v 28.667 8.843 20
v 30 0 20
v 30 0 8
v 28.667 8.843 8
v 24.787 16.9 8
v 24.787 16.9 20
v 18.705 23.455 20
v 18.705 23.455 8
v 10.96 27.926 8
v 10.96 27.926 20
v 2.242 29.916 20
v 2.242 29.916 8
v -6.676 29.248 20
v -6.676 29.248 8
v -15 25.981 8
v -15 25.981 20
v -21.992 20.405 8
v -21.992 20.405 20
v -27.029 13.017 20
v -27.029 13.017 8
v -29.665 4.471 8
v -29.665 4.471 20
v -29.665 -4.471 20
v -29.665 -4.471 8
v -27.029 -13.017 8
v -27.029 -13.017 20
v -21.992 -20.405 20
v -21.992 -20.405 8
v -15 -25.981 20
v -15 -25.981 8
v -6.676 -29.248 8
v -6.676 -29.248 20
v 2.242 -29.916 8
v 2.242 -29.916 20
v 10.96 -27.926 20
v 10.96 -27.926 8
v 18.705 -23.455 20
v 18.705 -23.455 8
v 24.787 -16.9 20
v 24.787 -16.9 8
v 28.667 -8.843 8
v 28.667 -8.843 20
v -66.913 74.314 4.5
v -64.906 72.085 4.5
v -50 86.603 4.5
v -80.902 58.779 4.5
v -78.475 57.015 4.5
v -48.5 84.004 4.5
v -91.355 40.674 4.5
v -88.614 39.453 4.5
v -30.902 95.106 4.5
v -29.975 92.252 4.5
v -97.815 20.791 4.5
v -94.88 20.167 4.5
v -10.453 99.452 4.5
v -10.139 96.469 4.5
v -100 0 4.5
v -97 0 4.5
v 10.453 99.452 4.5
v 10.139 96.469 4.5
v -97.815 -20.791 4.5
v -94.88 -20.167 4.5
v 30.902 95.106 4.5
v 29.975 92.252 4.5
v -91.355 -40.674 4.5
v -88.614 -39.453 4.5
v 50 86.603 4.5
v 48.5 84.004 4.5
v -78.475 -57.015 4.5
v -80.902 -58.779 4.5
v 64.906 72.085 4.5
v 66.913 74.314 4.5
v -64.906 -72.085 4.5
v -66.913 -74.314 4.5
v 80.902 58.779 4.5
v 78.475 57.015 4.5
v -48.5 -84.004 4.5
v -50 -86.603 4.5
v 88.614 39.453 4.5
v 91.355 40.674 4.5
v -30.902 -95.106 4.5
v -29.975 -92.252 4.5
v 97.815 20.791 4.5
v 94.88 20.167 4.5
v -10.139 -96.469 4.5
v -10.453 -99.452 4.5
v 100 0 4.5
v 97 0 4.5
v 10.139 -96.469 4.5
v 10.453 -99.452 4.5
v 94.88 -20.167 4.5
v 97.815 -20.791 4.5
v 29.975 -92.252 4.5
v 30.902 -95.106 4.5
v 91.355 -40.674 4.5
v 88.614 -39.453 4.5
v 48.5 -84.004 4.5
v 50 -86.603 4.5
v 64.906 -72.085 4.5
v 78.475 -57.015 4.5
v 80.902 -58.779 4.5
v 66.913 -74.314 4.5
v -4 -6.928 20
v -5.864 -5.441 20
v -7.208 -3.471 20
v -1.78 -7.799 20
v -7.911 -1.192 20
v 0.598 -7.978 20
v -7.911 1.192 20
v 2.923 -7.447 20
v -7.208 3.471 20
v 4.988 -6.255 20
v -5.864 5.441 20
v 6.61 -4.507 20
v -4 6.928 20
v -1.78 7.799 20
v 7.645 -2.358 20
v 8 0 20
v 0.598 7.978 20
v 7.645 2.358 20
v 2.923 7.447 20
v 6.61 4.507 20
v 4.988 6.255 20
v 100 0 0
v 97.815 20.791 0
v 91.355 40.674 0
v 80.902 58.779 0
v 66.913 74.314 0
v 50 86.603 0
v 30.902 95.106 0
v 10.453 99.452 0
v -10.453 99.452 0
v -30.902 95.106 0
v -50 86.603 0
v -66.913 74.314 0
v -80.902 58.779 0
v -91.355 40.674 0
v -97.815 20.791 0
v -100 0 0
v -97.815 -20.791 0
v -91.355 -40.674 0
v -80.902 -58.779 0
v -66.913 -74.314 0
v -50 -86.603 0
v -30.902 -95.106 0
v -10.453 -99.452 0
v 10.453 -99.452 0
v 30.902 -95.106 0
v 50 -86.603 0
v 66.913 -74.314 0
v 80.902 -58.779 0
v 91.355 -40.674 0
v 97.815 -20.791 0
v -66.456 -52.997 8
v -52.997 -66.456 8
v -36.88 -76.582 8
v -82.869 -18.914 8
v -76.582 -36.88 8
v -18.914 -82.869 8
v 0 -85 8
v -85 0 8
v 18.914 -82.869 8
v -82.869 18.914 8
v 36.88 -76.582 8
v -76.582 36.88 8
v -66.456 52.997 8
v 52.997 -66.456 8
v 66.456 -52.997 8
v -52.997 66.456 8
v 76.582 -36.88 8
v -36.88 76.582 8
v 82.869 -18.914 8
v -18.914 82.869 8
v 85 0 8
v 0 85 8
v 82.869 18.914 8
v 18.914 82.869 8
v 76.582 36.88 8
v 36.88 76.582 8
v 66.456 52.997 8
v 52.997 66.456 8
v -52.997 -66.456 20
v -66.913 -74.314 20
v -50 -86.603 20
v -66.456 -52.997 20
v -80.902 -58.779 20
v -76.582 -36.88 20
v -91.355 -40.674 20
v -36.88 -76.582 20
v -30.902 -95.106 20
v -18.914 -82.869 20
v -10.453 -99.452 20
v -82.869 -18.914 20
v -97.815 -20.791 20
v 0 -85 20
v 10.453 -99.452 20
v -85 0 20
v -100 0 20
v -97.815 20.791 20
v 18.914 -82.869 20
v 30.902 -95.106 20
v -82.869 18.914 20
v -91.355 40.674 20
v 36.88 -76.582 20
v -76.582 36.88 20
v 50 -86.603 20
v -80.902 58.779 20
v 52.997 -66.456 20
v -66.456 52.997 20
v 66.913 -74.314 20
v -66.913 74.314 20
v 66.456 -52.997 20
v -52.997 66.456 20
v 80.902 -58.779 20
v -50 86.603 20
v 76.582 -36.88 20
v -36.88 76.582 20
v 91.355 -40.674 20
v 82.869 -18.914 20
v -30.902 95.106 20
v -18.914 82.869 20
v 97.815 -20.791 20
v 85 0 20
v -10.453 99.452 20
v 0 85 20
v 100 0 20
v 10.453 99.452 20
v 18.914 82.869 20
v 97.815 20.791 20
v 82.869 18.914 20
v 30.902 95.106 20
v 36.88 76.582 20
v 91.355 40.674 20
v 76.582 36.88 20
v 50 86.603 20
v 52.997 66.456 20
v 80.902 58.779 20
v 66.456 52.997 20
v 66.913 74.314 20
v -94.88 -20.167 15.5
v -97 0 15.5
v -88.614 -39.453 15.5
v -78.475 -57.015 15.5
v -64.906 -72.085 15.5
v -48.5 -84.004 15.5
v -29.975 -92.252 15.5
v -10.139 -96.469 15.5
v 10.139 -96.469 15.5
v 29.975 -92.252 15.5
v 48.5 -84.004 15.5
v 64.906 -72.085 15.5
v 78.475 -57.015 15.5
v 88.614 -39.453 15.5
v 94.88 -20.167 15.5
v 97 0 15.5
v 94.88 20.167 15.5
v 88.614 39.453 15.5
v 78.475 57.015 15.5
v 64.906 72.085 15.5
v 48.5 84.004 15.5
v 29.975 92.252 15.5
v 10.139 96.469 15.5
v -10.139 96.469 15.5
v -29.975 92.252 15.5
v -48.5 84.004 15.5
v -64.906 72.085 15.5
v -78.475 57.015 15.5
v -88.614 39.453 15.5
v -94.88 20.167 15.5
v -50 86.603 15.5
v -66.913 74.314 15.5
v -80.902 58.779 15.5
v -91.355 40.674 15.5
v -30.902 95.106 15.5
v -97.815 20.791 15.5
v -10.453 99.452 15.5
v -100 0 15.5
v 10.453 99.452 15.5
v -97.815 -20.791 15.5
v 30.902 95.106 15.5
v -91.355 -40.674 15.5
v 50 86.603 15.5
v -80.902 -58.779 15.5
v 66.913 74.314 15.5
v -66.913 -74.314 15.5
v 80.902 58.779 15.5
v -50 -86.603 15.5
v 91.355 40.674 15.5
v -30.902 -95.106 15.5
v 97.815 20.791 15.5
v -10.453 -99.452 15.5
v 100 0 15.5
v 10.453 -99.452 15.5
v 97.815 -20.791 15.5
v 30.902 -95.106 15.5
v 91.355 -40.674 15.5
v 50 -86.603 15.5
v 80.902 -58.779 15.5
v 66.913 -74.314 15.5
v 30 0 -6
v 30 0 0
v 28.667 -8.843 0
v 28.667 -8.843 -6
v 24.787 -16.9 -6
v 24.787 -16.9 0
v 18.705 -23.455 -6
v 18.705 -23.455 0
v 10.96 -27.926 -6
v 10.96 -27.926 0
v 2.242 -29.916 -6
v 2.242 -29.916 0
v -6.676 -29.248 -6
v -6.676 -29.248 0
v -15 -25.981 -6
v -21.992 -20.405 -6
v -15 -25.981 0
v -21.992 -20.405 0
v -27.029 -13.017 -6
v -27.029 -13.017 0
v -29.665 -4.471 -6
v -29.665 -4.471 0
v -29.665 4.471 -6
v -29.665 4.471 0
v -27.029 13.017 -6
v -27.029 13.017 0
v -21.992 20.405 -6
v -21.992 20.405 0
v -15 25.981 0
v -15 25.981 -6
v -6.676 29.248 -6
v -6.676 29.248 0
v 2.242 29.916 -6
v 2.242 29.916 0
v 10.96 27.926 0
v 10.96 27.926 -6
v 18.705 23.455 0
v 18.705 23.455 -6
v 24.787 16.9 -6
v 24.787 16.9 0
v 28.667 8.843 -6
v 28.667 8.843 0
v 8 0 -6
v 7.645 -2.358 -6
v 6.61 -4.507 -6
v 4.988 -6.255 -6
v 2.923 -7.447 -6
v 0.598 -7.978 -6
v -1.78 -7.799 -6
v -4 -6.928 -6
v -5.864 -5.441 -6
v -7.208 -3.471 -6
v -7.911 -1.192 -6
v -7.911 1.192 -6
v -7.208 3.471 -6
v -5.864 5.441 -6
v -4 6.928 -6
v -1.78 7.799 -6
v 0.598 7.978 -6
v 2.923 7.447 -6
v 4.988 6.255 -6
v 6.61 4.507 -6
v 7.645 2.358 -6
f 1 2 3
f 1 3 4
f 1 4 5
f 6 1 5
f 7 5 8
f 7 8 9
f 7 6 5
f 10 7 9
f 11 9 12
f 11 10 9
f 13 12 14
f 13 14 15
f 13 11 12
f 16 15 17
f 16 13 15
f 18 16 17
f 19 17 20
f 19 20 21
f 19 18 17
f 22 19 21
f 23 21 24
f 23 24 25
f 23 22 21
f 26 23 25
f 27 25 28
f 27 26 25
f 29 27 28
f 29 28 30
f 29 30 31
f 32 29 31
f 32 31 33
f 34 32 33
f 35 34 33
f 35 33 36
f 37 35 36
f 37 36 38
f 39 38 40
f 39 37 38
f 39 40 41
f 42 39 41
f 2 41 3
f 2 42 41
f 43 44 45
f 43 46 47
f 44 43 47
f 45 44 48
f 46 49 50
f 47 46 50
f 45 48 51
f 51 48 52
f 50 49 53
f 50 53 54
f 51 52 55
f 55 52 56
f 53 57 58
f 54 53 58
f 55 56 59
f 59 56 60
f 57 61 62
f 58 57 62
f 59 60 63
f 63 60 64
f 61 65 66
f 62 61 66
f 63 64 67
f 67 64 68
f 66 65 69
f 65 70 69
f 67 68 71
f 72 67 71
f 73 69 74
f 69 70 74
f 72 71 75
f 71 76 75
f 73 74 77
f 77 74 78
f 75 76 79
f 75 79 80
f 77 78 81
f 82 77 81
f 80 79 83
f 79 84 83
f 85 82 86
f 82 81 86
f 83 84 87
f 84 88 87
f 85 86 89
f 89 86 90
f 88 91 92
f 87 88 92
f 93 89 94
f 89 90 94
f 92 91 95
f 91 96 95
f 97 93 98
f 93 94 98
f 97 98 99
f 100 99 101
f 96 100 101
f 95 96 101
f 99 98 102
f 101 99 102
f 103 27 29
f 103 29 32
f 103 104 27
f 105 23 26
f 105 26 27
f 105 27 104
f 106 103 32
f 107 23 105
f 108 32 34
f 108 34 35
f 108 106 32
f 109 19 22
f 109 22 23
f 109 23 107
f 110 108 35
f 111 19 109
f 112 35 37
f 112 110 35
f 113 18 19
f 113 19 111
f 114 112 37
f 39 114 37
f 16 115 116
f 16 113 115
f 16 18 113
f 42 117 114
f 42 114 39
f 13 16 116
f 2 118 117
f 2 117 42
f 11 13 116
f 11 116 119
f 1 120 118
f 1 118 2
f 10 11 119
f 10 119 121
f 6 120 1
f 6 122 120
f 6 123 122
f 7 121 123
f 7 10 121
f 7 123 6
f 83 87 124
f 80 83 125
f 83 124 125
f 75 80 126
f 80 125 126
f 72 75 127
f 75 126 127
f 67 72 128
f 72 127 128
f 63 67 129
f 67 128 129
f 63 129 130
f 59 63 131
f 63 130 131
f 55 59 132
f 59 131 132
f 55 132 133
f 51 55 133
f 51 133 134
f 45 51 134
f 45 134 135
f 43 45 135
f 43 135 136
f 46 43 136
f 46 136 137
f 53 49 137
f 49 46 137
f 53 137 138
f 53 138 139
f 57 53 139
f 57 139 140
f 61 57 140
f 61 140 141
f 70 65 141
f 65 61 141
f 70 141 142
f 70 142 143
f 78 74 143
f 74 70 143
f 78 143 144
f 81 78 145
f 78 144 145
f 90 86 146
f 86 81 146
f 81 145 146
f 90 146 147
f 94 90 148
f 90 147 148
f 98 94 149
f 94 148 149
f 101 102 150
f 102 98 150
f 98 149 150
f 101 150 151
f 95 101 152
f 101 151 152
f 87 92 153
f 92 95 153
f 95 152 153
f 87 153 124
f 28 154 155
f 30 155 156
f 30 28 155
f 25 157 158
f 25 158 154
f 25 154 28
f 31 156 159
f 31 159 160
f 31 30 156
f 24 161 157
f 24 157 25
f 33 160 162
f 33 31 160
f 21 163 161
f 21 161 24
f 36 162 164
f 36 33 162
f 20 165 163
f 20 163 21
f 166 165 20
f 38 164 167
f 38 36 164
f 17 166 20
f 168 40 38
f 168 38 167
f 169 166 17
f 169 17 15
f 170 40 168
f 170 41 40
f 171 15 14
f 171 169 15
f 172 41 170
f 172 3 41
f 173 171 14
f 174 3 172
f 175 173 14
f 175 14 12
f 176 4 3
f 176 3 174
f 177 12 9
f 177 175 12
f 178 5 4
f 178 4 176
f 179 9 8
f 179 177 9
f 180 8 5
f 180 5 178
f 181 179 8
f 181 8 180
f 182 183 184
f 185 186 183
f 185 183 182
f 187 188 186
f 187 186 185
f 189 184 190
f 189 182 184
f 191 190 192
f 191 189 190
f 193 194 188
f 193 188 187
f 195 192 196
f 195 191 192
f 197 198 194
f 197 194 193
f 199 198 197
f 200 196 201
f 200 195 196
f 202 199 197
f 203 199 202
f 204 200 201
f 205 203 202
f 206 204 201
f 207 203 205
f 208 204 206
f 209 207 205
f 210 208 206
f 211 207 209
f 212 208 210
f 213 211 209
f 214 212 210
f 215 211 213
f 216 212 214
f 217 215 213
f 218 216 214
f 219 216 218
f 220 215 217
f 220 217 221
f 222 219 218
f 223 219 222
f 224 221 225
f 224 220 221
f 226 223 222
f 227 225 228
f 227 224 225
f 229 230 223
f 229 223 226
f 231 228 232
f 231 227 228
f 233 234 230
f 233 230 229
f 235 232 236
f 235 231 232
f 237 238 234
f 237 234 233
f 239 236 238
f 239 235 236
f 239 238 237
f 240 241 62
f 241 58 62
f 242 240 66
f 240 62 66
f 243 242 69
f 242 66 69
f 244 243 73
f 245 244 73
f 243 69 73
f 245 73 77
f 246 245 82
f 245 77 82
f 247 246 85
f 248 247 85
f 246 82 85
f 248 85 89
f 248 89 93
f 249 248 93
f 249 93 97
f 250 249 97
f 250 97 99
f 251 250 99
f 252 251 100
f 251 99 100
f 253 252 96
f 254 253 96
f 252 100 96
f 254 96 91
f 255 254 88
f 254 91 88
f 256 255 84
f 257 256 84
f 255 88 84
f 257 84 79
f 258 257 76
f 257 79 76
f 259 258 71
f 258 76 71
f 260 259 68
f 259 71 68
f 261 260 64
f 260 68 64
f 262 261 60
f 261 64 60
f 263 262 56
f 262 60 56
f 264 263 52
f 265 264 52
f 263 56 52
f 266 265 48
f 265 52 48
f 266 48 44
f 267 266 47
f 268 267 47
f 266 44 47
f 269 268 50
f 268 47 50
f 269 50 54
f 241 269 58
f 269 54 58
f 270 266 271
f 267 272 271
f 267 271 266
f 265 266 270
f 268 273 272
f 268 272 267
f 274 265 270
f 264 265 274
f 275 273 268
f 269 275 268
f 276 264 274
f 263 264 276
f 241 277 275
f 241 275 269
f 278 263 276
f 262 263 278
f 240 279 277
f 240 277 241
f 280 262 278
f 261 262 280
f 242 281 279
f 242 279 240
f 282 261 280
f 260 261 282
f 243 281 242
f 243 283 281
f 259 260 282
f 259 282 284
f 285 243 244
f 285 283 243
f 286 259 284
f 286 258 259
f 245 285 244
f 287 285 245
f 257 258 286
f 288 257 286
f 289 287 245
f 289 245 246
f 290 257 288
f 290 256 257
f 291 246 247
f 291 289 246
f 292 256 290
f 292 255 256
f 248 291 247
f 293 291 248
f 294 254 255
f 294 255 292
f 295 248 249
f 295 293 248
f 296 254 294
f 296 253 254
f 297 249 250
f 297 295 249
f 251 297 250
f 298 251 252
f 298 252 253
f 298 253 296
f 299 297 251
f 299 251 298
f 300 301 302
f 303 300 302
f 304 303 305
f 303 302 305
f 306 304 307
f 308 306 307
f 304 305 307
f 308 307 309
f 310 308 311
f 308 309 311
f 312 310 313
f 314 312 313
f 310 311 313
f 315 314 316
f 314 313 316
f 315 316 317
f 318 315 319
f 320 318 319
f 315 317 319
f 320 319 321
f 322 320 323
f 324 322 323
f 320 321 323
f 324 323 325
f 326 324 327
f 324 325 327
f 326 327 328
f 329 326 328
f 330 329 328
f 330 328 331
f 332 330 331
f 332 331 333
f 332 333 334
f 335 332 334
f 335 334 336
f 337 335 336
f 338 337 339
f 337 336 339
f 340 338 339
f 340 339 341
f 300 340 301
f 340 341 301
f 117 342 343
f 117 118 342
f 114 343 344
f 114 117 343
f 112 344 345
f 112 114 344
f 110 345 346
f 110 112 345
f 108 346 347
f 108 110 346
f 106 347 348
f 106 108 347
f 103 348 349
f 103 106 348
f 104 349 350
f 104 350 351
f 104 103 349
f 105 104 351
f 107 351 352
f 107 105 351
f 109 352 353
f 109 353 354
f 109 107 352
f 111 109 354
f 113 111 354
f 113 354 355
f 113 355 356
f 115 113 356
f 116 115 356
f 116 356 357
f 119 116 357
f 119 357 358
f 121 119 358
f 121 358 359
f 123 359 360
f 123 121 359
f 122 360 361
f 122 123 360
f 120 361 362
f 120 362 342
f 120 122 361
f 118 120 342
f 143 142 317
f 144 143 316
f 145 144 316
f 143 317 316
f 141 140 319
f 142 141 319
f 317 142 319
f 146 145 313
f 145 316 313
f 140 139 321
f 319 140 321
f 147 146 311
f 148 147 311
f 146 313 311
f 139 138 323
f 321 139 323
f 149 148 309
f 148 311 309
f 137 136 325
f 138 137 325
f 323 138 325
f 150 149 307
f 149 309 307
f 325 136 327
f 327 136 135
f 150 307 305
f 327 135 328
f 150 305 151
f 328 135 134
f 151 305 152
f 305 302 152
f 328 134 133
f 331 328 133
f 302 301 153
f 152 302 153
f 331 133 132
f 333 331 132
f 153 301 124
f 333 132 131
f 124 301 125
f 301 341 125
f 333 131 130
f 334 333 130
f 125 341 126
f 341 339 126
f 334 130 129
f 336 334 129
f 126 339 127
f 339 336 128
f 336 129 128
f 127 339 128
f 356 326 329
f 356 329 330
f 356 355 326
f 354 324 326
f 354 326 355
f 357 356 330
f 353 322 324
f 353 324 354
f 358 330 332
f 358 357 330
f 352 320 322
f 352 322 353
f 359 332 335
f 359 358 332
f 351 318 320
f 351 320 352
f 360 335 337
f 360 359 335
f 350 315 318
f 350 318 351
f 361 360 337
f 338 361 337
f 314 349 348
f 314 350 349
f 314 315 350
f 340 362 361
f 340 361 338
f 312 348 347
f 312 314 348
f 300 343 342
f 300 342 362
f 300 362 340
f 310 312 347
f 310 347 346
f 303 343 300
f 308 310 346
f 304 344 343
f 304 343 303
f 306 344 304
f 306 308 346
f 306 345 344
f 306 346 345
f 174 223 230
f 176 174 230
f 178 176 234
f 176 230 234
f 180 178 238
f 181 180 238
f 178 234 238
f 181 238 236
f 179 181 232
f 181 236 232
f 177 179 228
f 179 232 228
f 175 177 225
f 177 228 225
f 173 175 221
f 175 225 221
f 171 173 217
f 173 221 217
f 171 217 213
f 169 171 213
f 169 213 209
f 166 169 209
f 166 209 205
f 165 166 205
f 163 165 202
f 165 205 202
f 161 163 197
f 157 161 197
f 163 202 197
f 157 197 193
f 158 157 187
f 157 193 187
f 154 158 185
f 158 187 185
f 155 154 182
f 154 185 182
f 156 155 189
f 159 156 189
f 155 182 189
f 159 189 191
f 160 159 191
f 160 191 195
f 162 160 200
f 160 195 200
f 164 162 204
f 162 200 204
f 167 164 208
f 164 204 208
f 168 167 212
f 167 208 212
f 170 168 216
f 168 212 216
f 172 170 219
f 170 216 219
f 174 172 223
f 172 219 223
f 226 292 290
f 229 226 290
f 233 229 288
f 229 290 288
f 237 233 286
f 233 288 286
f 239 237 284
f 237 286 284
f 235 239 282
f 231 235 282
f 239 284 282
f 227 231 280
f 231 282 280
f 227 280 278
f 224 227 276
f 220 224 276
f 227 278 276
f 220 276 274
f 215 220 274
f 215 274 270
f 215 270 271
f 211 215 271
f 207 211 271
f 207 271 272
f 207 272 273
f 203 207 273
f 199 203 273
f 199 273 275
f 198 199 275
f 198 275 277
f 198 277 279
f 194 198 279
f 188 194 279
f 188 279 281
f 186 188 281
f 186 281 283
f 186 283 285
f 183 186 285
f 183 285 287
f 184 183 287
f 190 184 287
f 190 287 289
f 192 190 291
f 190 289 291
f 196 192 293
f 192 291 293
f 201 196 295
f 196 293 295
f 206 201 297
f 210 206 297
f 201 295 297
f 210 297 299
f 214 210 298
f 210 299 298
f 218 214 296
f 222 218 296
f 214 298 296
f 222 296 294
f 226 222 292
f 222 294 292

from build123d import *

# Parameters (mm, degrees)
SKETCH_1_R          = 100
EXTRUDE_1_DEPTH     = 20
SKETCH_2_R          = 8
CUT_EXTRUDE_1_DEPTH = 20
SKETCH_3_R          = 85
SKETCH_3_R_2        = 30
CUT_EXTRUDE_2_DEPTH = 12
SKETCH_5_W          = 3
SKETCH_5_H          = 11
SKETCH_8_R          = 30
EXTRUDE_2_DEPTH     = 6
CUT_EXTRUDE_START   = -52
SKETCH_9_R          = 8
CUT_EXTRUDE_4_DEPTH = 52


with BuildPart() as part:
    # 草图1 → 凸台-拉伸1 (new body)
    with BuildSketch(Plane.XY):
        Circle(SKETCH_1_R)
    extrude(amount=EXTRUDE_1_DEPTH)

    # 草图2 → 切除-拉伸1 (cut)
    with BuildSketch(Plane.XY.offset(20)):
        Circle(SKETCH_2_R)
    extrude(amount=-CUT_EXTRUDE_1_DEPTH, mode=Mode.SUBTRACT)

    # 草图3 → 切除-拉伸2 (cut)
    with BuildSketch(Plane.XY.offset(20)):
        Circle(SKETCH_3_R)
        Circle(SKETCH_3_R_2, mode=Mode.SUBTRACT)
    extrude(amount=-CUT_EXTRUDE_2_DEPTH, mode=Mode.SUBTRACT)

    # 草图5 → 切除-旋转2 (revolve, cut)
    with BuildSketch(Plane(origin=(0, 0, 0), x_dir=(1, 0, 0), z_dir=(0, 1, 0)), mode=Mode.PRIVATE) as cut_revolve_2_sk:
        with Locations((98.5, -10)):
            Rectangle(SKETCH_5_W, SKETCH_5_H)
    revolve(cut_revolve_2_sk.sketch.rotate(Axis((0, 0, -40.303548102), (0, 0, 1)), 180), axis=Axis((0, 0, -40.303548102), (0, 0, 1)), mode=Mode.SUBTRACT)

    # 草图8 → 凸台-拉伸2 (add)
    with BuildSketch(Plane(origin=(0, 0, 0), x_dir=(-1, 0, 0), z_dir=(0, 0, -1))):
        with Locations(Location((0, 0, 0), (0, 0, 180))):
            Circle(SKETCH_8_R)
    extrude(amount=EXTRUDE_2_DEPTH)

    # 草图9 → 切除-拉伸4 (cut)
    with BuildSketch(Plane(origin=(0, 0, -6), x_dir=(-1, 0, 0), z_dir=(0, 0, -1)).offset(CUT_EXTRUDE_START)):
        with Locations(Location((0, 0, 0), (0, 0, 180))):
            Circle(SKETCH_9_R)
    extrude(amount=CUT_EXTRUDE_4_DEPTH, mode=Mode.SUBTRACT)


solid = part.part
